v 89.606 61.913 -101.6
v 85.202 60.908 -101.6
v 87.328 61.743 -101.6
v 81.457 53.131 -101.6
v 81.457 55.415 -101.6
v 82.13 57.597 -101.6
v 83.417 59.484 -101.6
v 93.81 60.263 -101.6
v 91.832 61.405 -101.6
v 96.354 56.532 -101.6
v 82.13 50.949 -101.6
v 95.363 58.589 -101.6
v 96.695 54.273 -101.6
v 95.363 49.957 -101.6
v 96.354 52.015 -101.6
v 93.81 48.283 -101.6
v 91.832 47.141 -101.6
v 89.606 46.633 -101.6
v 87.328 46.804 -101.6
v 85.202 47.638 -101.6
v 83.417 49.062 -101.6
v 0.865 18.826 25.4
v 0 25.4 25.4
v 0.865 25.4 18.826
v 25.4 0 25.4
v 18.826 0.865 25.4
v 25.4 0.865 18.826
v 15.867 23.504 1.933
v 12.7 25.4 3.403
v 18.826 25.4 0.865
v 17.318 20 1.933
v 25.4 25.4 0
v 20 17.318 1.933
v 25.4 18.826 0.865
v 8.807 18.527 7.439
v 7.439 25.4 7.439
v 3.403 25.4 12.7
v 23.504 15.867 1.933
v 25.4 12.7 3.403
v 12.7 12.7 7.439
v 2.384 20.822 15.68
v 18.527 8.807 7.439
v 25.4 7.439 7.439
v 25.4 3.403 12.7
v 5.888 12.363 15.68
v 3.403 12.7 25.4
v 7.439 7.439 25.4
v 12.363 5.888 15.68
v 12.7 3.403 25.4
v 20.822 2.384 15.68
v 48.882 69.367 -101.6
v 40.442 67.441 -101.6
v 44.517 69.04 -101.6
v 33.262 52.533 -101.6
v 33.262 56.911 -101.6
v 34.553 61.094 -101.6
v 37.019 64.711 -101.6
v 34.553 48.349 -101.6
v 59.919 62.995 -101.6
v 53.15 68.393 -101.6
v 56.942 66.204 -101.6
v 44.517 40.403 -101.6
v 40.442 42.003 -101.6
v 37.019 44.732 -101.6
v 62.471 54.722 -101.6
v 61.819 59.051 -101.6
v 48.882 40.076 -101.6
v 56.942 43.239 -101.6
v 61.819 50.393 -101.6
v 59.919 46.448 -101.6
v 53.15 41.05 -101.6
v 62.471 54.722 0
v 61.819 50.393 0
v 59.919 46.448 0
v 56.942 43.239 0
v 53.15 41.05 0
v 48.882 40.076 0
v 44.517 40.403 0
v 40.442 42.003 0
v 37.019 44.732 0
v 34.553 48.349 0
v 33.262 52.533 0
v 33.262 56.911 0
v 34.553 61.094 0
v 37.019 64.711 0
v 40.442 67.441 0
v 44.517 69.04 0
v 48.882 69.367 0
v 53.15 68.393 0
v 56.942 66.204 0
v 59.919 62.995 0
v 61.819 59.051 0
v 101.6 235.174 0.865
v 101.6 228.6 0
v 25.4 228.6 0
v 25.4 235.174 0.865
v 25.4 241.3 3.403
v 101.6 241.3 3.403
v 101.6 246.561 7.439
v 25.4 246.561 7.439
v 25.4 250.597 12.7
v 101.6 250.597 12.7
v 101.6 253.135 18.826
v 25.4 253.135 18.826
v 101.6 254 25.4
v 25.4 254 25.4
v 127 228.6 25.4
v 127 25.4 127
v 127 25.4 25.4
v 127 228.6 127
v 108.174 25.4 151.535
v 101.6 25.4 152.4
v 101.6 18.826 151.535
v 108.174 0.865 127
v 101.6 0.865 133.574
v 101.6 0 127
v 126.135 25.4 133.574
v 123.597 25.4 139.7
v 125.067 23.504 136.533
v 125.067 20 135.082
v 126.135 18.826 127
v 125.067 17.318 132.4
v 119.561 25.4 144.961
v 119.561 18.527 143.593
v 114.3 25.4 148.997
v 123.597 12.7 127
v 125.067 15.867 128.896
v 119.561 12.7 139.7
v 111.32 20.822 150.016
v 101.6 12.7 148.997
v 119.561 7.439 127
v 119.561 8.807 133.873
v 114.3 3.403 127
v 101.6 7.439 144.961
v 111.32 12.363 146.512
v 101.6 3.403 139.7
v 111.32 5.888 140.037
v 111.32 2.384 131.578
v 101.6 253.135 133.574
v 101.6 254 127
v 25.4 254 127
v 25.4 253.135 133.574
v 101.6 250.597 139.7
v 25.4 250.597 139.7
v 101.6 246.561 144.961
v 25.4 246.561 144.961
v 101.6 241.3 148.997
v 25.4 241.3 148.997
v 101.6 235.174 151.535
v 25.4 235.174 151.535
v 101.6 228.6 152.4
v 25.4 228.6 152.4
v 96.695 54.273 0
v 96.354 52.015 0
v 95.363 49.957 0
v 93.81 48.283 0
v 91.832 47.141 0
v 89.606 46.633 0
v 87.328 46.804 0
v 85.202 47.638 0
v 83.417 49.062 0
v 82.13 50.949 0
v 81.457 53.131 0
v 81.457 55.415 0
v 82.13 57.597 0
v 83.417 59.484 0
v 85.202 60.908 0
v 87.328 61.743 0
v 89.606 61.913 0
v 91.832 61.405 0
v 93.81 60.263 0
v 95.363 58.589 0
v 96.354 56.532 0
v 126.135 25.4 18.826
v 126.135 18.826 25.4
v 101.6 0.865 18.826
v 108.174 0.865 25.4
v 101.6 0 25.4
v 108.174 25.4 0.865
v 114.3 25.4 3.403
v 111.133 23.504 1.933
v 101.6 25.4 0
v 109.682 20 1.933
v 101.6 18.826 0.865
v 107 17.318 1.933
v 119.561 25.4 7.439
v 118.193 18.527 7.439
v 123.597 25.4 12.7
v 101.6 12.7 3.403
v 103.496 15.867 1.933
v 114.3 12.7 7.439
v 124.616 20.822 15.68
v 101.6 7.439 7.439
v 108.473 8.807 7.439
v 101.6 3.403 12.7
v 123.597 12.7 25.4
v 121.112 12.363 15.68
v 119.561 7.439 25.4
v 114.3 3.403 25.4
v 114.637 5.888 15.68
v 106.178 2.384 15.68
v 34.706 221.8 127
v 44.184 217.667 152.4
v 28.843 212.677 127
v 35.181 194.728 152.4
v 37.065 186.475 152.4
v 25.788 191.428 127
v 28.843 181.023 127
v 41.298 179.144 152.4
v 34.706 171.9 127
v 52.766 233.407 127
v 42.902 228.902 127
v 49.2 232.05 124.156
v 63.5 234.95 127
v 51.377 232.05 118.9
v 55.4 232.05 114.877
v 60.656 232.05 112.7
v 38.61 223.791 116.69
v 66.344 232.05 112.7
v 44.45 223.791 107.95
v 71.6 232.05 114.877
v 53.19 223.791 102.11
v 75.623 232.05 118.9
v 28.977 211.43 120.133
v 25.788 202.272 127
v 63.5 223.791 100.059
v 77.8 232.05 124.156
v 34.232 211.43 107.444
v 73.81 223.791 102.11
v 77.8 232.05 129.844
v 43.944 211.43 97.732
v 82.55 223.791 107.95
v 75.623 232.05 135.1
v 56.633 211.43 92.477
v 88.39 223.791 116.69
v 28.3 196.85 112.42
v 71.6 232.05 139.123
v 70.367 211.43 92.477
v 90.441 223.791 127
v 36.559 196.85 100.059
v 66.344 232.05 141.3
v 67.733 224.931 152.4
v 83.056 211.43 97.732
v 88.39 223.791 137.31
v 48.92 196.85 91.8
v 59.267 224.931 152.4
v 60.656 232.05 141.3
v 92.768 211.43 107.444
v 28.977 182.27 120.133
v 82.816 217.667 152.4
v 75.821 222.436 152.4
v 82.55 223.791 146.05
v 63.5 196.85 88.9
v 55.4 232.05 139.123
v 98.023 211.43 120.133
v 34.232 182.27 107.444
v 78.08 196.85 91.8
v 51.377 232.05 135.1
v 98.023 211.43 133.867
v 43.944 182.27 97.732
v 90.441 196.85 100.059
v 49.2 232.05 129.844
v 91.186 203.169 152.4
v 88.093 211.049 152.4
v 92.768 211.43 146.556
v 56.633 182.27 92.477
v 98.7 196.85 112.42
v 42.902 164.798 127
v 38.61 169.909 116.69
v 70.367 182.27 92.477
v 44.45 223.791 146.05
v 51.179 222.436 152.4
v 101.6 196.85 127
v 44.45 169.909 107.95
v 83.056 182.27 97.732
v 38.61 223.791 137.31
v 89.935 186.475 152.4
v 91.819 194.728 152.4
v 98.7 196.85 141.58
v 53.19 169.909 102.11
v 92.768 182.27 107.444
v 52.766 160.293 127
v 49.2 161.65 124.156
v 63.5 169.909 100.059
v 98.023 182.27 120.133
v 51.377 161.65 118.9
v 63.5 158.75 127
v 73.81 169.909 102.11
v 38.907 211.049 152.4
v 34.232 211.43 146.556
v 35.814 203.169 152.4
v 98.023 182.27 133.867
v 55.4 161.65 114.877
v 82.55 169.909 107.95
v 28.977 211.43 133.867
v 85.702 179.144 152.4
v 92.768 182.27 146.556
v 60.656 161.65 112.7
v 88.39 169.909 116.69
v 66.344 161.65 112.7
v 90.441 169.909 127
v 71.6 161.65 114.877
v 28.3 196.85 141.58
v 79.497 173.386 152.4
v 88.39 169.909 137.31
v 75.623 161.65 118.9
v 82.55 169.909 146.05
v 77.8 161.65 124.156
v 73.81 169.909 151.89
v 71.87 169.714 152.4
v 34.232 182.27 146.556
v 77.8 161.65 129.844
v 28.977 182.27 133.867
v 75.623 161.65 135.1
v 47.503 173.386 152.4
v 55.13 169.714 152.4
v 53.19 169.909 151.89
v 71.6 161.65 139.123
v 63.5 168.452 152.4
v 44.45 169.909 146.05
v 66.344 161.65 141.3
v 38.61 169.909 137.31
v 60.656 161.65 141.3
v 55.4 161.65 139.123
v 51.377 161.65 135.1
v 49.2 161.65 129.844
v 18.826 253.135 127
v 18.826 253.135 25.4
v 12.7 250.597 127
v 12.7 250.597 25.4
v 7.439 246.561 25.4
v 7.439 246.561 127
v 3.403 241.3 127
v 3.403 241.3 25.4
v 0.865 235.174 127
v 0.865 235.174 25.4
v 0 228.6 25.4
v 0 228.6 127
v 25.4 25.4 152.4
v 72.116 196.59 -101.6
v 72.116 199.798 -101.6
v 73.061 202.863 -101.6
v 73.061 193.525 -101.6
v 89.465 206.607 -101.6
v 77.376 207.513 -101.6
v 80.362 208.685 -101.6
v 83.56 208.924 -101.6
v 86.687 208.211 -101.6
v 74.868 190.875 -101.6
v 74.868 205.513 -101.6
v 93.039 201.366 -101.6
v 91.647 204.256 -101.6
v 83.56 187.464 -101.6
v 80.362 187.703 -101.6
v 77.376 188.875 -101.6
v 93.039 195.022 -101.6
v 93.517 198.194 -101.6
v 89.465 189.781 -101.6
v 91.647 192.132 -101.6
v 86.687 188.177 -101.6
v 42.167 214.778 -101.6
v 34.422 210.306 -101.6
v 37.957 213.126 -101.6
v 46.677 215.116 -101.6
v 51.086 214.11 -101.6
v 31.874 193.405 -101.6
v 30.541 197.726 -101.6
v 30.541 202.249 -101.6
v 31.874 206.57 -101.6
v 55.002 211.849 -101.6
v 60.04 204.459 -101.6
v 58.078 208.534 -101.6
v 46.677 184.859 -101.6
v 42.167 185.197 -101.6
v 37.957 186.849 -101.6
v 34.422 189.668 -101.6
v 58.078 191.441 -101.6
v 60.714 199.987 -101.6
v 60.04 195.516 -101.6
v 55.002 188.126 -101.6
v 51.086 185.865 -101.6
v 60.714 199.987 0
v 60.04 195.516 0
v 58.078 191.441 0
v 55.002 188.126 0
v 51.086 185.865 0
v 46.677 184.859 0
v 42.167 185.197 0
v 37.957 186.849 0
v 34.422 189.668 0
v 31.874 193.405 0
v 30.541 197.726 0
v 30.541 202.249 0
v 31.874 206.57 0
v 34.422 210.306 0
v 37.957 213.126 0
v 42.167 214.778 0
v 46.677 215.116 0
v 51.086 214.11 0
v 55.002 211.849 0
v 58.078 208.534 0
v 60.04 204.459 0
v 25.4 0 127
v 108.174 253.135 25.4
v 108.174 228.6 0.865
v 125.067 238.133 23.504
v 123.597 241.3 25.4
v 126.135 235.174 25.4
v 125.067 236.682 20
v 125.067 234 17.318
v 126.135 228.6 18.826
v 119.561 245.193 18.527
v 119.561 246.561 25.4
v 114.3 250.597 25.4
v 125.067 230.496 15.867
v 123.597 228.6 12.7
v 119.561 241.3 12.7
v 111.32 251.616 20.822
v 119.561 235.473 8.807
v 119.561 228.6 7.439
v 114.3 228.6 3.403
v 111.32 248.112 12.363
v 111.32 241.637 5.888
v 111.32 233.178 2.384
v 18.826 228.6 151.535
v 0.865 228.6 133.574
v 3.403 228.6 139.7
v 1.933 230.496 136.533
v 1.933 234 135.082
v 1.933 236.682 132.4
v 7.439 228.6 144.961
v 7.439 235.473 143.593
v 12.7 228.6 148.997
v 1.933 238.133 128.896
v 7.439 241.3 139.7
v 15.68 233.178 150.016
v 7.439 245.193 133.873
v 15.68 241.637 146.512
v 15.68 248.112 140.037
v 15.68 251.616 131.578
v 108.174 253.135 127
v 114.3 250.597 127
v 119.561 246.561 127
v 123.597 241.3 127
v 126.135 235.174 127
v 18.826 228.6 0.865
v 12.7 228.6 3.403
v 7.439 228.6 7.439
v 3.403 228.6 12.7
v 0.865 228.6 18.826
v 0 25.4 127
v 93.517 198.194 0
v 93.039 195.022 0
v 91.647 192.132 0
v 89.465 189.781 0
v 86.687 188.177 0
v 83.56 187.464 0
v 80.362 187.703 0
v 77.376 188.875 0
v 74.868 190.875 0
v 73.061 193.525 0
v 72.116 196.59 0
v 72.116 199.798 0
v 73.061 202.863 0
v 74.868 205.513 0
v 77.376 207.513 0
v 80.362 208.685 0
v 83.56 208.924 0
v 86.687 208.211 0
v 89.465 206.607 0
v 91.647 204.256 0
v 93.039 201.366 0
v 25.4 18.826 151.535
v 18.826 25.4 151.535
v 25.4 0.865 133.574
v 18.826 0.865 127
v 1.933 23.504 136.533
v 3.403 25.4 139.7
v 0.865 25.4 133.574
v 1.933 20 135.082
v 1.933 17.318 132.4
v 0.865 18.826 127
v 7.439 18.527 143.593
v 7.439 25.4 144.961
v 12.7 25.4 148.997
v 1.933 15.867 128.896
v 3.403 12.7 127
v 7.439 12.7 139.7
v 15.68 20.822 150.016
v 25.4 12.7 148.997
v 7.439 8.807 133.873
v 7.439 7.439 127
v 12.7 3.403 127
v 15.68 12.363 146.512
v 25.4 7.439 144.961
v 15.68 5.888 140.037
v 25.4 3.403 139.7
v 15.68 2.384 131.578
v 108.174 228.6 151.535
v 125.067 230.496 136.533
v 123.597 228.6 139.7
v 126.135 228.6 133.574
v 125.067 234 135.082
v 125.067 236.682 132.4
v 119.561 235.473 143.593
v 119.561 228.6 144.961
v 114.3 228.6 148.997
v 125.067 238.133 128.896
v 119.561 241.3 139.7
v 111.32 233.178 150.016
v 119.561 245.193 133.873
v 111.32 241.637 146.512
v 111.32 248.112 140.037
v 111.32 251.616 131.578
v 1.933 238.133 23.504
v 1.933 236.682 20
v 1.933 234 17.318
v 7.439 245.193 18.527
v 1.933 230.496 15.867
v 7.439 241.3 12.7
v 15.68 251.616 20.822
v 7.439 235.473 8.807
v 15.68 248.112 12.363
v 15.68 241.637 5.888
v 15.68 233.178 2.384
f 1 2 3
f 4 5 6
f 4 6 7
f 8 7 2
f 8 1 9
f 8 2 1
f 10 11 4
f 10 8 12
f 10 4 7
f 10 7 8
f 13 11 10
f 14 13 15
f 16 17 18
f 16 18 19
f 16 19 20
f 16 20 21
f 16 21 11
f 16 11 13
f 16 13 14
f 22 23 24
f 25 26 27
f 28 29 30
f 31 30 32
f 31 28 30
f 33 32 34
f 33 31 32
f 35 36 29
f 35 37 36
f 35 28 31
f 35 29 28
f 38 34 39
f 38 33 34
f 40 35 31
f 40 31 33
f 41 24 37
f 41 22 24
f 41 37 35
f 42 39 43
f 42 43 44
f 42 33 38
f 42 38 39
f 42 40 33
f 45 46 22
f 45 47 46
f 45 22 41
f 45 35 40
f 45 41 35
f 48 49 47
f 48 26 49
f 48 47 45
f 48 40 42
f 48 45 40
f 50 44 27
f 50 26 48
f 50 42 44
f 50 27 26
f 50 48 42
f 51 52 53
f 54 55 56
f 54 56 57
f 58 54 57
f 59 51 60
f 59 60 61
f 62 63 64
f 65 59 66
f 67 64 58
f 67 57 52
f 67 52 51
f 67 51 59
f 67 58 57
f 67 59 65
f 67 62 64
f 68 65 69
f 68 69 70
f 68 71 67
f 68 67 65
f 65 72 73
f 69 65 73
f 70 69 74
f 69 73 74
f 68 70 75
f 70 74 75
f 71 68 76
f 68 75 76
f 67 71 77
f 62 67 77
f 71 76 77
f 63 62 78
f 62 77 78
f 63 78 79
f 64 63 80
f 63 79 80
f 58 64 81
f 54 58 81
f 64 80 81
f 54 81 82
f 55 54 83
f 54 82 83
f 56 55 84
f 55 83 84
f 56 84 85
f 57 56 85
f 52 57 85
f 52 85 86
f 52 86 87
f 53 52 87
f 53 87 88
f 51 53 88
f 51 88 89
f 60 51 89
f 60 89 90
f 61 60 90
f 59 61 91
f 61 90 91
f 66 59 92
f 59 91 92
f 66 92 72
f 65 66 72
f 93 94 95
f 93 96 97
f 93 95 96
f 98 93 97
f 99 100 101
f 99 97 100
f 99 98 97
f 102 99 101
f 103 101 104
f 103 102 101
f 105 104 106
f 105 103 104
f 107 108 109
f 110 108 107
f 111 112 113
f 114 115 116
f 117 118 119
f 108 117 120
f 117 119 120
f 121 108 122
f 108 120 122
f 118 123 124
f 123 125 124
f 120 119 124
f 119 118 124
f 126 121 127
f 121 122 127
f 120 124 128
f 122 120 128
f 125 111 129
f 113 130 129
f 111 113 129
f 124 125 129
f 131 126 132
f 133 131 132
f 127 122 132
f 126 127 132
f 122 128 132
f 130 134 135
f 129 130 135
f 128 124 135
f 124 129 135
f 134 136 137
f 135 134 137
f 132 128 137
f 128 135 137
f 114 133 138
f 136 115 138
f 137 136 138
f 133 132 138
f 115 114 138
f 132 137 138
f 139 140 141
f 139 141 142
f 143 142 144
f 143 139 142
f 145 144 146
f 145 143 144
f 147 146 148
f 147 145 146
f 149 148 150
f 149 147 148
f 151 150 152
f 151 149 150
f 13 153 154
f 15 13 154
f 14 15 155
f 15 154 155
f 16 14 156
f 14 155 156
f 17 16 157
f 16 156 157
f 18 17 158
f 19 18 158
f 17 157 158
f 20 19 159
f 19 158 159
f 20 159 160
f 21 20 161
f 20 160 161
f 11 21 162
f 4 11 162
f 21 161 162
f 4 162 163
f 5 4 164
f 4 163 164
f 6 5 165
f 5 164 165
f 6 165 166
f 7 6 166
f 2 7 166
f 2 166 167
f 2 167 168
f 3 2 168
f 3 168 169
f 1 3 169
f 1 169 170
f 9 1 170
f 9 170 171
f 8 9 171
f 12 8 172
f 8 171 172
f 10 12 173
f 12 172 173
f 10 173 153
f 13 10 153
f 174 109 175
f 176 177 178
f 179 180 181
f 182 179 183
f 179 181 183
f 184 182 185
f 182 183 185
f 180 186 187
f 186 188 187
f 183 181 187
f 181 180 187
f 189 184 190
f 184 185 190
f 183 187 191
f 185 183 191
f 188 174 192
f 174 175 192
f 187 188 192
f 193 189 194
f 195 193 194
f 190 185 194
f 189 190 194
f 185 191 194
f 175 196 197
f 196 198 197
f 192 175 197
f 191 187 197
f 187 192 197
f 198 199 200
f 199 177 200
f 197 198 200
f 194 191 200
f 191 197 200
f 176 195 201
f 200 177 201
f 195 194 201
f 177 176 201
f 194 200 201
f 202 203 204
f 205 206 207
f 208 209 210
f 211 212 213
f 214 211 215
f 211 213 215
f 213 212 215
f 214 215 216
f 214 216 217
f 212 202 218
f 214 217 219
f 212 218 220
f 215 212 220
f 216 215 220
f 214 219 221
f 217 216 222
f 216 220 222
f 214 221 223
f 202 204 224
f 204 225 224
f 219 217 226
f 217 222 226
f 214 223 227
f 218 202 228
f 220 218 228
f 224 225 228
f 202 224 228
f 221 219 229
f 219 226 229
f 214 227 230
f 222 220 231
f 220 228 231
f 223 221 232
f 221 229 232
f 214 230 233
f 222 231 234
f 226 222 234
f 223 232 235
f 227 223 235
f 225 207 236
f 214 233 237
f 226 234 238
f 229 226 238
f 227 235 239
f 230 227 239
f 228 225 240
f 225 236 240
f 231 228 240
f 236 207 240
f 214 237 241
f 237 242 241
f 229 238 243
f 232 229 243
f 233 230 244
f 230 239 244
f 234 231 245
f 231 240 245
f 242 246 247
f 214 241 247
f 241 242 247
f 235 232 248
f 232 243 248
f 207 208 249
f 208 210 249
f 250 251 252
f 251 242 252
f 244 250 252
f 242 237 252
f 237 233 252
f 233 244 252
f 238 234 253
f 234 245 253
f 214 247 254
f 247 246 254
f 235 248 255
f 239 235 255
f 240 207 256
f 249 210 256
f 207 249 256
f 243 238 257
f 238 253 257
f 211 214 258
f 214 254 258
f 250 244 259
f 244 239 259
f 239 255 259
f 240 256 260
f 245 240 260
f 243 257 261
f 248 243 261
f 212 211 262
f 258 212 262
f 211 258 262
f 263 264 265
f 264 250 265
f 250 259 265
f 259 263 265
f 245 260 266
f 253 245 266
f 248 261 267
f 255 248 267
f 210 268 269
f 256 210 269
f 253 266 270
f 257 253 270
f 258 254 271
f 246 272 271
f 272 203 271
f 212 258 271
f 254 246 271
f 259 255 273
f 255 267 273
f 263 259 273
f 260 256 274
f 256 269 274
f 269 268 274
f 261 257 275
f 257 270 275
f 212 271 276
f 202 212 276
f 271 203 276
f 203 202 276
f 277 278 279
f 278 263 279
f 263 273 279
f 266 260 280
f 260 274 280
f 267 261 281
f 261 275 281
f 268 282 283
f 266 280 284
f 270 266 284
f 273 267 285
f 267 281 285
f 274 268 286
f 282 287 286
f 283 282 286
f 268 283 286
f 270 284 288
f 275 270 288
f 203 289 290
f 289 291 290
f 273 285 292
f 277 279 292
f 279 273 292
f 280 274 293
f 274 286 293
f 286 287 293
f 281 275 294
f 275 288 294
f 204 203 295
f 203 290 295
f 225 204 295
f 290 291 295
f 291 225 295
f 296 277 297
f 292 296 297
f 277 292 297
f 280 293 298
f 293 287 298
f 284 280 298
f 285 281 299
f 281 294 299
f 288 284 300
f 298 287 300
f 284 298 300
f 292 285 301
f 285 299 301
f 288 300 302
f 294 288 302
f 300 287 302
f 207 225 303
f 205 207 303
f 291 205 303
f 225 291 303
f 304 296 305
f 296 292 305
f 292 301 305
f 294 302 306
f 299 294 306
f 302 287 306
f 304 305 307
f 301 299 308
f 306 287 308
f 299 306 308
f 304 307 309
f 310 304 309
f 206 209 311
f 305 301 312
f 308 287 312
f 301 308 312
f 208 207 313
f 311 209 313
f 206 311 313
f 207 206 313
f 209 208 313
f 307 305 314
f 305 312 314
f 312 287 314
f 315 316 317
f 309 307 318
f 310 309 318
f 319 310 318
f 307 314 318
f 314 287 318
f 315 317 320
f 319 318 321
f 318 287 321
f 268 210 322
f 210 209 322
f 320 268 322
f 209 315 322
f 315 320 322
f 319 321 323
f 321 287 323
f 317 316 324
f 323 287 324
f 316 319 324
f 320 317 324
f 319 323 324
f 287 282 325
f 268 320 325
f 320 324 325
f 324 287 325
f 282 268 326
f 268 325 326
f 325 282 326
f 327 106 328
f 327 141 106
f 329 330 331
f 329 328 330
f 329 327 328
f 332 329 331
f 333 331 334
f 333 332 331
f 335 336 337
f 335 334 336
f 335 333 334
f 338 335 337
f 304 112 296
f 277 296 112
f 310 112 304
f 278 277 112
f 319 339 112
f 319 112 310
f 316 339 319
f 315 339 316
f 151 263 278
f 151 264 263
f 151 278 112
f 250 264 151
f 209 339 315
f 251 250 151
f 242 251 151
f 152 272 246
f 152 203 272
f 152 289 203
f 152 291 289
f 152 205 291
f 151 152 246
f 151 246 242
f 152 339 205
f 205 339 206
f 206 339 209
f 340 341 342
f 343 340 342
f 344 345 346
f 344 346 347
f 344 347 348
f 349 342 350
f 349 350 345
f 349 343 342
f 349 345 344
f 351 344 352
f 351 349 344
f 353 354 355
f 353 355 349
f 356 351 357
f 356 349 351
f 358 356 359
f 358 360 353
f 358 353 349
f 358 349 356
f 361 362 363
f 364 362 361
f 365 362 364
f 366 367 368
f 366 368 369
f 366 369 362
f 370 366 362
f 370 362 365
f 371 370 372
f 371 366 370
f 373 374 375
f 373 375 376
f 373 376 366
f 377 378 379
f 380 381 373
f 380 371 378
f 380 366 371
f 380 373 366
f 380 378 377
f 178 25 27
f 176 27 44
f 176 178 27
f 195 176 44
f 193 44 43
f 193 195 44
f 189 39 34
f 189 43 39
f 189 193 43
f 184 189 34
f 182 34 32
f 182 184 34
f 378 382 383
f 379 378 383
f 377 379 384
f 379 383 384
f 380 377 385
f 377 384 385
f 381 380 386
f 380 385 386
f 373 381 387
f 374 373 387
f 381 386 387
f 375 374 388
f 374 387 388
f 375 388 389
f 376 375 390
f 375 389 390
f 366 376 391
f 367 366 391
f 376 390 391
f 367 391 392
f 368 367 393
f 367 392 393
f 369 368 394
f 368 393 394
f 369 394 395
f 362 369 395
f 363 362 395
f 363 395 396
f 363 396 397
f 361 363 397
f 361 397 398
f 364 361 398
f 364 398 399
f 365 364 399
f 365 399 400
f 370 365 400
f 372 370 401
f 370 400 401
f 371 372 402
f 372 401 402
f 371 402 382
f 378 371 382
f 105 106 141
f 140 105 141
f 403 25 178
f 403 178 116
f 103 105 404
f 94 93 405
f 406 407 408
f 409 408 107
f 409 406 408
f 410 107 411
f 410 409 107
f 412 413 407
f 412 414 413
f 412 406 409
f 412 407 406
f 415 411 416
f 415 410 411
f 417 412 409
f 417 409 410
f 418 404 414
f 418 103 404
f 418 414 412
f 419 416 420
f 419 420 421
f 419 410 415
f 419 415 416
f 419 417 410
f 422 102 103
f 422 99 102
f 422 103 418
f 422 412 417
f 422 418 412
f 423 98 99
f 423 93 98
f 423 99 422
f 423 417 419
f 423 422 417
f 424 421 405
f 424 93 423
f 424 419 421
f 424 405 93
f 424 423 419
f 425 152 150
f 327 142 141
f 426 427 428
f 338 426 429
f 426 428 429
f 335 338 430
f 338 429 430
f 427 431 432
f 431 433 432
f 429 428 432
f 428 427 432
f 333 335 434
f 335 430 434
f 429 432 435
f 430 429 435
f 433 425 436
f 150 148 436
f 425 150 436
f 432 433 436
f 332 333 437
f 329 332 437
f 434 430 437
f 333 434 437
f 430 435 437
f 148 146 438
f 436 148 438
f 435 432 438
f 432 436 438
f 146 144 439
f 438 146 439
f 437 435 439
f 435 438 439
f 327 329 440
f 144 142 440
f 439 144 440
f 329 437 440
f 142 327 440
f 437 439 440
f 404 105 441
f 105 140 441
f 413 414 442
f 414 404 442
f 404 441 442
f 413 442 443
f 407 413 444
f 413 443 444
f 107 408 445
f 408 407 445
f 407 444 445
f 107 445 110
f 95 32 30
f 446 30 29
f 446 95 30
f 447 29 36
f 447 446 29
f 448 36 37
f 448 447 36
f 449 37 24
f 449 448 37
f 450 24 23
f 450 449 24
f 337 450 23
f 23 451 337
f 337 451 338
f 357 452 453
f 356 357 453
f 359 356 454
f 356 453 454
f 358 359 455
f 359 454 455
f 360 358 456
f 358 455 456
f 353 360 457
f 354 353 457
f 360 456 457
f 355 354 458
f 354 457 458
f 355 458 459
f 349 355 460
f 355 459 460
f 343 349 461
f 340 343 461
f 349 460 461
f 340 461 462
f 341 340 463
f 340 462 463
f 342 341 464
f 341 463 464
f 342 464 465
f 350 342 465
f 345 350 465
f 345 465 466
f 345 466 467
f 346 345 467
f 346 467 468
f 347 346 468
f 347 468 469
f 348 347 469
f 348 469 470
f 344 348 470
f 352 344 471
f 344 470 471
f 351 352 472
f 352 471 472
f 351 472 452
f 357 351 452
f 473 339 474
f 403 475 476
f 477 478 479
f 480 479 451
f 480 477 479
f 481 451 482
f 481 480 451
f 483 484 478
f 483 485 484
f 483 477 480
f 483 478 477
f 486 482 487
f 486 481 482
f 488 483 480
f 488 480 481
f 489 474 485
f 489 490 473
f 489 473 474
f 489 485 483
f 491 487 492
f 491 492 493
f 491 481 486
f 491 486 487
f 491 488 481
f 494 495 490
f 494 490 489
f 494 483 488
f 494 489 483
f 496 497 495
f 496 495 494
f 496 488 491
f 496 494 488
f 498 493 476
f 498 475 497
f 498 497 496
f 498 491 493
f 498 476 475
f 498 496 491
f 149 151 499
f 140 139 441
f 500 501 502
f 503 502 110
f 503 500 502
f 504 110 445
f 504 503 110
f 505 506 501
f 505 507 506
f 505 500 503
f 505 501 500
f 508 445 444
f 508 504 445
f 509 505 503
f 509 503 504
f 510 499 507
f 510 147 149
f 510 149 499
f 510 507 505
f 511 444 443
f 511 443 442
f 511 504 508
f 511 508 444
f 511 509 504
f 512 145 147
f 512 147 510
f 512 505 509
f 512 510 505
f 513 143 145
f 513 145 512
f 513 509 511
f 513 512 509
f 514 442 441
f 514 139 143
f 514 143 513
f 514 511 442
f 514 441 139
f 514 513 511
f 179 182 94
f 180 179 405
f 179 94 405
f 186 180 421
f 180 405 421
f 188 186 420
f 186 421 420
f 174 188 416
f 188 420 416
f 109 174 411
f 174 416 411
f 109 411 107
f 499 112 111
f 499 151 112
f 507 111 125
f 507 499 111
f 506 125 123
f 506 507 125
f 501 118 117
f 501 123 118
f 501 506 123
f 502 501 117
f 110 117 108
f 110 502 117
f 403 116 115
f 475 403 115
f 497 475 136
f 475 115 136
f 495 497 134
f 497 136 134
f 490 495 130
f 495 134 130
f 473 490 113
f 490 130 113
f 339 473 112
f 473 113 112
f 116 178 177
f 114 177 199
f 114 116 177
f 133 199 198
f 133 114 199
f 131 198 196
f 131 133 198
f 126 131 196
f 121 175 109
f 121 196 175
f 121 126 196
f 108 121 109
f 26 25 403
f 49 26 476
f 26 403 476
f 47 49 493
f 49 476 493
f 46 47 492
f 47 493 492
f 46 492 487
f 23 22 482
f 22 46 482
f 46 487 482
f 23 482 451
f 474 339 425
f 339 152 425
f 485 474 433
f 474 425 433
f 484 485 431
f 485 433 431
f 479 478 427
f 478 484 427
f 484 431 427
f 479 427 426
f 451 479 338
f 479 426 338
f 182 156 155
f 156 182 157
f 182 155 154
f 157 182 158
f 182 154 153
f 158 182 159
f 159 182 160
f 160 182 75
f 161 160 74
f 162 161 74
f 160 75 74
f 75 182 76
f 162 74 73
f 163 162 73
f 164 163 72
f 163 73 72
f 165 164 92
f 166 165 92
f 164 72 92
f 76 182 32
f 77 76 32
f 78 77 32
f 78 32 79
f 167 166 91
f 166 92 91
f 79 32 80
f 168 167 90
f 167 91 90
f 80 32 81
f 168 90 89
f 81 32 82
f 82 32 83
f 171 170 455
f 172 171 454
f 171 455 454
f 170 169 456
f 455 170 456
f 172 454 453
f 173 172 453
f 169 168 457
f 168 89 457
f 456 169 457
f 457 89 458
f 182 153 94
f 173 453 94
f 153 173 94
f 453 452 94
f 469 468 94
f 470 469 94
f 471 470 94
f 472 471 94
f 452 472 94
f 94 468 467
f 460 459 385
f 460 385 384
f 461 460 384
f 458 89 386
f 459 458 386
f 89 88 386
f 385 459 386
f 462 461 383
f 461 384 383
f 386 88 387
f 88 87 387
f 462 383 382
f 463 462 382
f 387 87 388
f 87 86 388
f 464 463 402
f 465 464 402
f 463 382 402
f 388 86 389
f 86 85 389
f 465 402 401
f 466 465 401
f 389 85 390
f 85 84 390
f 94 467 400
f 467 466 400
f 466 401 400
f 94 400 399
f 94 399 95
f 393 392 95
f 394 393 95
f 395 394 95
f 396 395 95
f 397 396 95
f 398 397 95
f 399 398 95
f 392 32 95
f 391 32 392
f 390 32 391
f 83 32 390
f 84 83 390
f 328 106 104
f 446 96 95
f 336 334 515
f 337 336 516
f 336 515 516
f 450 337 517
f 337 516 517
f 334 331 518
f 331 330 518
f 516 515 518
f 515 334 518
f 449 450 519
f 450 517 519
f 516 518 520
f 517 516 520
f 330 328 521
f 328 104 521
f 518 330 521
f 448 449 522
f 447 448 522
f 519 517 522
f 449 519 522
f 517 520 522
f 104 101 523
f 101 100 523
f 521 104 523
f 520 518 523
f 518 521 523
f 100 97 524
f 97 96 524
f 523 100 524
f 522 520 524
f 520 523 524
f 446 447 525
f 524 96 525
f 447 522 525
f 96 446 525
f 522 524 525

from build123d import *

# Parameters (mm, degrees)
F0_W     = 254
F0_H     = 152.4
F1_DEPTH = 127
F2_R     = 25.4
F6_R     = 14.6864926798
F6_R_2   = 7.661429367
F6_R_3   = 15.1712278357
F6_R_4   = 10.7604265213
F7_DEPTH = 101.6


with BuildPart() as f1:
    # F0 (on Right) → F1 (new body)
    with BuildSketch(Plane.YZ):
        with Locations((127, 76.2)):
            Rectangle(F0_W, F0_H)
    extrude(amount=F1_DEPTH)

    # F2
    f2_edges = [f1.edges().sort_by_distance(p)[0] for p in [
        (63.5, 254, 152.4),
        (63.5, 0, 152.4),
        (0, 127, 152.4),
        (127, 127, 152.4),
        (63.5, 254, 0),
        (0, 254, 76.2),
        (127, 254, 76.2),
        (127, 0, 76.2),
        (127, 127, 0),
        (0, 0, 76.2),
        (0, 127, 0),
        (63.5, 0, 0),
    ]]
    fillet(f2_edges, radius=F2_R)

    # F4 (on offset) → F5 (revolve, cut)
    with BuildSketch(Plane.XY.offset(127)):
        with BuildLine():
            Line((63.5, 158.75), (63.5, 234.95))
            ThreePointArc((63.5, 234.95), (25.4, 196.85), (63.5, 158.75))
        make_face()
    revolve(axis=Axis((63.5, 196.85, 127), (0, -1, 0)), mode=Mode.SUBTRACT)

    # F6 (on face) → F7 (join)
    with BuildSketch(Plane(origin=(0, 0, 0), x_dir=(1, 0, 0), z_dir=(0, 0, -1))):
        with Locations((47.7847903967, -54.721660912)):
            Circle(F6_R)
        with Locations((89.0330970287, -54.2733110487)):
            Circle(F6_R_2)
        with Locations((45.5430299044, -199.9874413013)):
            Circle(F6_R_3)
        with Locations((82.7561765909, -198.1940418482)):
            Circle(F6_R_4)
    extrude(amount=F7_DEPTH)


solid = f1.part
